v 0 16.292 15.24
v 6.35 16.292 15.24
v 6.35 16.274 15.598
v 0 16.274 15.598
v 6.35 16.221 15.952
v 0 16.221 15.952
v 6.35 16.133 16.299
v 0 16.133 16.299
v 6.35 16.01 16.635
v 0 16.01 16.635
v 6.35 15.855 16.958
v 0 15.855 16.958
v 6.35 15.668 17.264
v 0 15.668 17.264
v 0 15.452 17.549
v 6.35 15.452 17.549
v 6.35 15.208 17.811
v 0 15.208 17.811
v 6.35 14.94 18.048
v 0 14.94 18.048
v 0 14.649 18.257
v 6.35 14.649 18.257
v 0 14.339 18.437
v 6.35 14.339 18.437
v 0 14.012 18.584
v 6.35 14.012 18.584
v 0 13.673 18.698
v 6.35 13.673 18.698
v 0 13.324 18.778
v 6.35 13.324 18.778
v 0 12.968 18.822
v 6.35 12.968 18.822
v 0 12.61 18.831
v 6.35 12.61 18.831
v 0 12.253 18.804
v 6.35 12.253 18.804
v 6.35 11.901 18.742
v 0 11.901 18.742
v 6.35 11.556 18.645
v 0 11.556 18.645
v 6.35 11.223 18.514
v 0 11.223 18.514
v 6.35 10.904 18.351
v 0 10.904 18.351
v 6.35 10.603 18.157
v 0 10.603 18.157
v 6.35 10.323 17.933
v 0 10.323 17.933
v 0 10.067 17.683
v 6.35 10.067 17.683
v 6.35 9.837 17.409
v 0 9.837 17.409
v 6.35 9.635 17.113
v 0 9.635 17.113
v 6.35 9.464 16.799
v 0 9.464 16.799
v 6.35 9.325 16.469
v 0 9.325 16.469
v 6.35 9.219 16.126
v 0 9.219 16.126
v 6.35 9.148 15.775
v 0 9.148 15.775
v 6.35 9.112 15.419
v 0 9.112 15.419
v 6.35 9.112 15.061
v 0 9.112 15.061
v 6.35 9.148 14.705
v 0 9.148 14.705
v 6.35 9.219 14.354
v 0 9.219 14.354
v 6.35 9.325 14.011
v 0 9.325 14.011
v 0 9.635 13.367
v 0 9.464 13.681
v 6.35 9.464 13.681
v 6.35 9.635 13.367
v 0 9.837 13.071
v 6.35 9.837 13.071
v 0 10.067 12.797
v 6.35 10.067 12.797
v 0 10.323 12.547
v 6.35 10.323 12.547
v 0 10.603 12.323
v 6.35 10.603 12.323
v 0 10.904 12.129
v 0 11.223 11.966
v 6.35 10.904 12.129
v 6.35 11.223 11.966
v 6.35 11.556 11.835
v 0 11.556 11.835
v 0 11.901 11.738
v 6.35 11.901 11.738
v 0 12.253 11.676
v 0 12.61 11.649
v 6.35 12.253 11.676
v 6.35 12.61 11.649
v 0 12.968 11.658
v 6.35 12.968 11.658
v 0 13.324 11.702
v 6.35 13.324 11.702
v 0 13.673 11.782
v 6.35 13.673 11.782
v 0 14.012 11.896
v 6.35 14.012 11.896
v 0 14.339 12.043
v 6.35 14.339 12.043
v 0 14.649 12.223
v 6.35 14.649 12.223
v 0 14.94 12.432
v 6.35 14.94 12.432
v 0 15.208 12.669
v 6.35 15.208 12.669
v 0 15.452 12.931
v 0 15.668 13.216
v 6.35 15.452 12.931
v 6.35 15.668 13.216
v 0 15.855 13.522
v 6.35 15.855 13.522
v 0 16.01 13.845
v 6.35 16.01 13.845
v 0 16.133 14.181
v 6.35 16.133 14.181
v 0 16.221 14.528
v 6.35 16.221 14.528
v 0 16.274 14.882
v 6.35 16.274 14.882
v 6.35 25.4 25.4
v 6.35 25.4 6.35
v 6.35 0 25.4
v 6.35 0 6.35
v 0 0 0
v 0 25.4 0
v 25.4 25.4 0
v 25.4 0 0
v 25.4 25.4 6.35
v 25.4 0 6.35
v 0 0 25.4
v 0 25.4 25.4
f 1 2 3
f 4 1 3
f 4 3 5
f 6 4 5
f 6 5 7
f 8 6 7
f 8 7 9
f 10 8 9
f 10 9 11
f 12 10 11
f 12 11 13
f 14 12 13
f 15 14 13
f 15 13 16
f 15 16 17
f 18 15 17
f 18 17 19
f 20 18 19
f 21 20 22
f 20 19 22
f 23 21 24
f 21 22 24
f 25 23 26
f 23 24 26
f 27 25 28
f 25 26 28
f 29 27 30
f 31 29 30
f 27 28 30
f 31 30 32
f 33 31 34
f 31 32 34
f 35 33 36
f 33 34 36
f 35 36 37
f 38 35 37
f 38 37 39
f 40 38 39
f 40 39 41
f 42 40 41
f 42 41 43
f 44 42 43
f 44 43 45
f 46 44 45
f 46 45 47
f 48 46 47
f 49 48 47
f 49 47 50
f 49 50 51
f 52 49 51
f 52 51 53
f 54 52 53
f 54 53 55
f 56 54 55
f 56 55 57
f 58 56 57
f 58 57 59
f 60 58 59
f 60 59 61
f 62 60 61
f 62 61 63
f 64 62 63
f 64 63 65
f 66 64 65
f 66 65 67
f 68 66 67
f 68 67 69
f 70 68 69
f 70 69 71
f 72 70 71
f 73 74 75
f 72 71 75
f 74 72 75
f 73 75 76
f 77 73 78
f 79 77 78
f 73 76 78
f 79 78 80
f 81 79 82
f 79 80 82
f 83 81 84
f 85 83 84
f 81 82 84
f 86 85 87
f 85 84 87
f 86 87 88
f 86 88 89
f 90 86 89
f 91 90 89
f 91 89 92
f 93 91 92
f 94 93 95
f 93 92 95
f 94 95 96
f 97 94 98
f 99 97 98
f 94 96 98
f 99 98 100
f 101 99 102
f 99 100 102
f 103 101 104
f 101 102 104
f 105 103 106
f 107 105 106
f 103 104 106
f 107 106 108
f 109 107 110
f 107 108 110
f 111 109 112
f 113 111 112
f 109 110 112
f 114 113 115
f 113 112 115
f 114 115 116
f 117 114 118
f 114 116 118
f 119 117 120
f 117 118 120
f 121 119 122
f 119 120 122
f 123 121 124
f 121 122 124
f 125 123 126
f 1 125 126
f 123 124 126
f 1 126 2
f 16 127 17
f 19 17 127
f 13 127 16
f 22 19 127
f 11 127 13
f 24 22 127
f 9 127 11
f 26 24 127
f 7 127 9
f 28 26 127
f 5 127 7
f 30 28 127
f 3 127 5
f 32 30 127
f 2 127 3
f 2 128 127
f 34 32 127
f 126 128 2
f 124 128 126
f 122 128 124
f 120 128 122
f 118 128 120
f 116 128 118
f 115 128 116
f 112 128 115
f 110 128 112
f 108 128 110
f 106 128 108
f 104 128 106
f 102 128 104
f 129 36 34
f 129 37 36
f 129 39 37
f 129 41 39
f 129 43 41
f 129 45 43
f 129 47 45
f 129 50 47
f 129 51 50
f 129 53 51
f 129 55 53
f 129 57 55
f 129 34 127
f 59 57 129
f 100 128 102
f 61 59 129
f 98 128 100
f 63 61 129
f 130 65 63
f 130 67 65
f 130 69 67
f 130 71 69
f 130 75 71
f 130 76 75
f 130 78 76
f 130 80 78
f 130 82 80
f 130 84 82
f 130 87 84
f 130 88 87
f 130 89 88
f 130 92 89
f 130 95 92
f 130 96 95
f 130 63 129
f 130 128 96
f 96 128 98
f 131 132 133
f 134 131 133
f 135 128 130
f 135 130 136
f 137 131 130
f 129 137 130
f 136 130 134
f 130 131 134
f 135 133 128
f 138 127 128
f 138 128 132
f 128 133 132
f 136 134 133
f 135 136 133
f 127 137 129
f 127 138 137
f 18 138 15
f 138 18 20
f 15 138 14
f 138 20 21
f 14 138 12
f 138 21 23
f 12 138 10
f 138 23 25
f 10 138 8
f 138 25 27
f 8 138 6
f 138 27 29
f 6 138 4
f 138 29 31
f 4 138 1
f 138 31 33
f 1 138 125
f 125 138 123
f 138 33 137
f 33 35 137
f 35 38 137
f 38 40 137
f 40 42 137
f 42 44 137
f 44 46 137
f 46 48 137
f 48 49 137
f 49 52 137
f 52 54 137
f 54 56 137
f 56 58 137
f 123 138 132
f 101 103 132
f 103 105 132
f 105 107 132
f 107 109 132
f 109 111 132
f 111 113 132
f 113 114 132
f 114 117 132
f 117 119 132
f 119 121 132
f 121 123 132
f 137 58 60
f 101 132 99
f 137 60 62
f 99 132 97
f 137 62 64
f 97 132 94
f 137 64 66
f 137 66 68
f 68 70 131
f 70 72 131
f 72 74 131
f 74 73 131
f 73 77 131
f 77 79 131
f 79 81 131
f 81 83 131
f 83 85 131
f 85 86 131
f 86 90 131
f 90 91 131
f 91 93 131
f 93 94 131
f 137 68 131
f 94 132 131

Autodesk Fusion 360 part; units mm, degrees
sketch "Sketch1" plane through (0, 0, 0) normal (0, 0, 1) x (1, 0, 0)
  line L0 (0, 0) -> (25.4, 0)
  line L1 (25.4, 0) -> (25.4, 25.4)
  line L2 (25.4, 25.4) -> (0, 25.4)
  line L3 (0, 25.4) -> (0, 0)
  line L4 (0, 25.4) -> (6.35, 25.4)
  line L5 (6.35, 25.4) -> (6.35, 0)
  line L6 (6.35, 0) -> (0, 0)
  line L7 (0, 0) -> (0, 25.4)
  dimension "d1" = 25.4
  dimension "d2" = 25.4
  dimension "d3" = 6.35
extrude "Extrude1" add sketch "Sketch1" along normal blind 6.35 contours L0 L1 L2 L5
extrude "Extrude2" add sketch "Sketch1" along normal blind 25.4 contours L0 L2 L3 L4 L5 L6 L7
sketch "Sketch2" plane through (6.35, 0, 0) normal (1, 0, 0) x (0, 1, 0)
  line L0 (0, 6.35) -> (25.4, 6.35)
  line L1 (25.4, 6.35) -> (25.4, 25.4)
  line L2 (25.4, 25.4) -> (0, 25.4)
  line L3 (0, 25.4) -> (0, 6.35)
  circle A0 centre (12.7, 15.24) radius 3.5921
extrude "Extrude3" cut sketch "Sketch2" against normal blind 38.1 contours A0
